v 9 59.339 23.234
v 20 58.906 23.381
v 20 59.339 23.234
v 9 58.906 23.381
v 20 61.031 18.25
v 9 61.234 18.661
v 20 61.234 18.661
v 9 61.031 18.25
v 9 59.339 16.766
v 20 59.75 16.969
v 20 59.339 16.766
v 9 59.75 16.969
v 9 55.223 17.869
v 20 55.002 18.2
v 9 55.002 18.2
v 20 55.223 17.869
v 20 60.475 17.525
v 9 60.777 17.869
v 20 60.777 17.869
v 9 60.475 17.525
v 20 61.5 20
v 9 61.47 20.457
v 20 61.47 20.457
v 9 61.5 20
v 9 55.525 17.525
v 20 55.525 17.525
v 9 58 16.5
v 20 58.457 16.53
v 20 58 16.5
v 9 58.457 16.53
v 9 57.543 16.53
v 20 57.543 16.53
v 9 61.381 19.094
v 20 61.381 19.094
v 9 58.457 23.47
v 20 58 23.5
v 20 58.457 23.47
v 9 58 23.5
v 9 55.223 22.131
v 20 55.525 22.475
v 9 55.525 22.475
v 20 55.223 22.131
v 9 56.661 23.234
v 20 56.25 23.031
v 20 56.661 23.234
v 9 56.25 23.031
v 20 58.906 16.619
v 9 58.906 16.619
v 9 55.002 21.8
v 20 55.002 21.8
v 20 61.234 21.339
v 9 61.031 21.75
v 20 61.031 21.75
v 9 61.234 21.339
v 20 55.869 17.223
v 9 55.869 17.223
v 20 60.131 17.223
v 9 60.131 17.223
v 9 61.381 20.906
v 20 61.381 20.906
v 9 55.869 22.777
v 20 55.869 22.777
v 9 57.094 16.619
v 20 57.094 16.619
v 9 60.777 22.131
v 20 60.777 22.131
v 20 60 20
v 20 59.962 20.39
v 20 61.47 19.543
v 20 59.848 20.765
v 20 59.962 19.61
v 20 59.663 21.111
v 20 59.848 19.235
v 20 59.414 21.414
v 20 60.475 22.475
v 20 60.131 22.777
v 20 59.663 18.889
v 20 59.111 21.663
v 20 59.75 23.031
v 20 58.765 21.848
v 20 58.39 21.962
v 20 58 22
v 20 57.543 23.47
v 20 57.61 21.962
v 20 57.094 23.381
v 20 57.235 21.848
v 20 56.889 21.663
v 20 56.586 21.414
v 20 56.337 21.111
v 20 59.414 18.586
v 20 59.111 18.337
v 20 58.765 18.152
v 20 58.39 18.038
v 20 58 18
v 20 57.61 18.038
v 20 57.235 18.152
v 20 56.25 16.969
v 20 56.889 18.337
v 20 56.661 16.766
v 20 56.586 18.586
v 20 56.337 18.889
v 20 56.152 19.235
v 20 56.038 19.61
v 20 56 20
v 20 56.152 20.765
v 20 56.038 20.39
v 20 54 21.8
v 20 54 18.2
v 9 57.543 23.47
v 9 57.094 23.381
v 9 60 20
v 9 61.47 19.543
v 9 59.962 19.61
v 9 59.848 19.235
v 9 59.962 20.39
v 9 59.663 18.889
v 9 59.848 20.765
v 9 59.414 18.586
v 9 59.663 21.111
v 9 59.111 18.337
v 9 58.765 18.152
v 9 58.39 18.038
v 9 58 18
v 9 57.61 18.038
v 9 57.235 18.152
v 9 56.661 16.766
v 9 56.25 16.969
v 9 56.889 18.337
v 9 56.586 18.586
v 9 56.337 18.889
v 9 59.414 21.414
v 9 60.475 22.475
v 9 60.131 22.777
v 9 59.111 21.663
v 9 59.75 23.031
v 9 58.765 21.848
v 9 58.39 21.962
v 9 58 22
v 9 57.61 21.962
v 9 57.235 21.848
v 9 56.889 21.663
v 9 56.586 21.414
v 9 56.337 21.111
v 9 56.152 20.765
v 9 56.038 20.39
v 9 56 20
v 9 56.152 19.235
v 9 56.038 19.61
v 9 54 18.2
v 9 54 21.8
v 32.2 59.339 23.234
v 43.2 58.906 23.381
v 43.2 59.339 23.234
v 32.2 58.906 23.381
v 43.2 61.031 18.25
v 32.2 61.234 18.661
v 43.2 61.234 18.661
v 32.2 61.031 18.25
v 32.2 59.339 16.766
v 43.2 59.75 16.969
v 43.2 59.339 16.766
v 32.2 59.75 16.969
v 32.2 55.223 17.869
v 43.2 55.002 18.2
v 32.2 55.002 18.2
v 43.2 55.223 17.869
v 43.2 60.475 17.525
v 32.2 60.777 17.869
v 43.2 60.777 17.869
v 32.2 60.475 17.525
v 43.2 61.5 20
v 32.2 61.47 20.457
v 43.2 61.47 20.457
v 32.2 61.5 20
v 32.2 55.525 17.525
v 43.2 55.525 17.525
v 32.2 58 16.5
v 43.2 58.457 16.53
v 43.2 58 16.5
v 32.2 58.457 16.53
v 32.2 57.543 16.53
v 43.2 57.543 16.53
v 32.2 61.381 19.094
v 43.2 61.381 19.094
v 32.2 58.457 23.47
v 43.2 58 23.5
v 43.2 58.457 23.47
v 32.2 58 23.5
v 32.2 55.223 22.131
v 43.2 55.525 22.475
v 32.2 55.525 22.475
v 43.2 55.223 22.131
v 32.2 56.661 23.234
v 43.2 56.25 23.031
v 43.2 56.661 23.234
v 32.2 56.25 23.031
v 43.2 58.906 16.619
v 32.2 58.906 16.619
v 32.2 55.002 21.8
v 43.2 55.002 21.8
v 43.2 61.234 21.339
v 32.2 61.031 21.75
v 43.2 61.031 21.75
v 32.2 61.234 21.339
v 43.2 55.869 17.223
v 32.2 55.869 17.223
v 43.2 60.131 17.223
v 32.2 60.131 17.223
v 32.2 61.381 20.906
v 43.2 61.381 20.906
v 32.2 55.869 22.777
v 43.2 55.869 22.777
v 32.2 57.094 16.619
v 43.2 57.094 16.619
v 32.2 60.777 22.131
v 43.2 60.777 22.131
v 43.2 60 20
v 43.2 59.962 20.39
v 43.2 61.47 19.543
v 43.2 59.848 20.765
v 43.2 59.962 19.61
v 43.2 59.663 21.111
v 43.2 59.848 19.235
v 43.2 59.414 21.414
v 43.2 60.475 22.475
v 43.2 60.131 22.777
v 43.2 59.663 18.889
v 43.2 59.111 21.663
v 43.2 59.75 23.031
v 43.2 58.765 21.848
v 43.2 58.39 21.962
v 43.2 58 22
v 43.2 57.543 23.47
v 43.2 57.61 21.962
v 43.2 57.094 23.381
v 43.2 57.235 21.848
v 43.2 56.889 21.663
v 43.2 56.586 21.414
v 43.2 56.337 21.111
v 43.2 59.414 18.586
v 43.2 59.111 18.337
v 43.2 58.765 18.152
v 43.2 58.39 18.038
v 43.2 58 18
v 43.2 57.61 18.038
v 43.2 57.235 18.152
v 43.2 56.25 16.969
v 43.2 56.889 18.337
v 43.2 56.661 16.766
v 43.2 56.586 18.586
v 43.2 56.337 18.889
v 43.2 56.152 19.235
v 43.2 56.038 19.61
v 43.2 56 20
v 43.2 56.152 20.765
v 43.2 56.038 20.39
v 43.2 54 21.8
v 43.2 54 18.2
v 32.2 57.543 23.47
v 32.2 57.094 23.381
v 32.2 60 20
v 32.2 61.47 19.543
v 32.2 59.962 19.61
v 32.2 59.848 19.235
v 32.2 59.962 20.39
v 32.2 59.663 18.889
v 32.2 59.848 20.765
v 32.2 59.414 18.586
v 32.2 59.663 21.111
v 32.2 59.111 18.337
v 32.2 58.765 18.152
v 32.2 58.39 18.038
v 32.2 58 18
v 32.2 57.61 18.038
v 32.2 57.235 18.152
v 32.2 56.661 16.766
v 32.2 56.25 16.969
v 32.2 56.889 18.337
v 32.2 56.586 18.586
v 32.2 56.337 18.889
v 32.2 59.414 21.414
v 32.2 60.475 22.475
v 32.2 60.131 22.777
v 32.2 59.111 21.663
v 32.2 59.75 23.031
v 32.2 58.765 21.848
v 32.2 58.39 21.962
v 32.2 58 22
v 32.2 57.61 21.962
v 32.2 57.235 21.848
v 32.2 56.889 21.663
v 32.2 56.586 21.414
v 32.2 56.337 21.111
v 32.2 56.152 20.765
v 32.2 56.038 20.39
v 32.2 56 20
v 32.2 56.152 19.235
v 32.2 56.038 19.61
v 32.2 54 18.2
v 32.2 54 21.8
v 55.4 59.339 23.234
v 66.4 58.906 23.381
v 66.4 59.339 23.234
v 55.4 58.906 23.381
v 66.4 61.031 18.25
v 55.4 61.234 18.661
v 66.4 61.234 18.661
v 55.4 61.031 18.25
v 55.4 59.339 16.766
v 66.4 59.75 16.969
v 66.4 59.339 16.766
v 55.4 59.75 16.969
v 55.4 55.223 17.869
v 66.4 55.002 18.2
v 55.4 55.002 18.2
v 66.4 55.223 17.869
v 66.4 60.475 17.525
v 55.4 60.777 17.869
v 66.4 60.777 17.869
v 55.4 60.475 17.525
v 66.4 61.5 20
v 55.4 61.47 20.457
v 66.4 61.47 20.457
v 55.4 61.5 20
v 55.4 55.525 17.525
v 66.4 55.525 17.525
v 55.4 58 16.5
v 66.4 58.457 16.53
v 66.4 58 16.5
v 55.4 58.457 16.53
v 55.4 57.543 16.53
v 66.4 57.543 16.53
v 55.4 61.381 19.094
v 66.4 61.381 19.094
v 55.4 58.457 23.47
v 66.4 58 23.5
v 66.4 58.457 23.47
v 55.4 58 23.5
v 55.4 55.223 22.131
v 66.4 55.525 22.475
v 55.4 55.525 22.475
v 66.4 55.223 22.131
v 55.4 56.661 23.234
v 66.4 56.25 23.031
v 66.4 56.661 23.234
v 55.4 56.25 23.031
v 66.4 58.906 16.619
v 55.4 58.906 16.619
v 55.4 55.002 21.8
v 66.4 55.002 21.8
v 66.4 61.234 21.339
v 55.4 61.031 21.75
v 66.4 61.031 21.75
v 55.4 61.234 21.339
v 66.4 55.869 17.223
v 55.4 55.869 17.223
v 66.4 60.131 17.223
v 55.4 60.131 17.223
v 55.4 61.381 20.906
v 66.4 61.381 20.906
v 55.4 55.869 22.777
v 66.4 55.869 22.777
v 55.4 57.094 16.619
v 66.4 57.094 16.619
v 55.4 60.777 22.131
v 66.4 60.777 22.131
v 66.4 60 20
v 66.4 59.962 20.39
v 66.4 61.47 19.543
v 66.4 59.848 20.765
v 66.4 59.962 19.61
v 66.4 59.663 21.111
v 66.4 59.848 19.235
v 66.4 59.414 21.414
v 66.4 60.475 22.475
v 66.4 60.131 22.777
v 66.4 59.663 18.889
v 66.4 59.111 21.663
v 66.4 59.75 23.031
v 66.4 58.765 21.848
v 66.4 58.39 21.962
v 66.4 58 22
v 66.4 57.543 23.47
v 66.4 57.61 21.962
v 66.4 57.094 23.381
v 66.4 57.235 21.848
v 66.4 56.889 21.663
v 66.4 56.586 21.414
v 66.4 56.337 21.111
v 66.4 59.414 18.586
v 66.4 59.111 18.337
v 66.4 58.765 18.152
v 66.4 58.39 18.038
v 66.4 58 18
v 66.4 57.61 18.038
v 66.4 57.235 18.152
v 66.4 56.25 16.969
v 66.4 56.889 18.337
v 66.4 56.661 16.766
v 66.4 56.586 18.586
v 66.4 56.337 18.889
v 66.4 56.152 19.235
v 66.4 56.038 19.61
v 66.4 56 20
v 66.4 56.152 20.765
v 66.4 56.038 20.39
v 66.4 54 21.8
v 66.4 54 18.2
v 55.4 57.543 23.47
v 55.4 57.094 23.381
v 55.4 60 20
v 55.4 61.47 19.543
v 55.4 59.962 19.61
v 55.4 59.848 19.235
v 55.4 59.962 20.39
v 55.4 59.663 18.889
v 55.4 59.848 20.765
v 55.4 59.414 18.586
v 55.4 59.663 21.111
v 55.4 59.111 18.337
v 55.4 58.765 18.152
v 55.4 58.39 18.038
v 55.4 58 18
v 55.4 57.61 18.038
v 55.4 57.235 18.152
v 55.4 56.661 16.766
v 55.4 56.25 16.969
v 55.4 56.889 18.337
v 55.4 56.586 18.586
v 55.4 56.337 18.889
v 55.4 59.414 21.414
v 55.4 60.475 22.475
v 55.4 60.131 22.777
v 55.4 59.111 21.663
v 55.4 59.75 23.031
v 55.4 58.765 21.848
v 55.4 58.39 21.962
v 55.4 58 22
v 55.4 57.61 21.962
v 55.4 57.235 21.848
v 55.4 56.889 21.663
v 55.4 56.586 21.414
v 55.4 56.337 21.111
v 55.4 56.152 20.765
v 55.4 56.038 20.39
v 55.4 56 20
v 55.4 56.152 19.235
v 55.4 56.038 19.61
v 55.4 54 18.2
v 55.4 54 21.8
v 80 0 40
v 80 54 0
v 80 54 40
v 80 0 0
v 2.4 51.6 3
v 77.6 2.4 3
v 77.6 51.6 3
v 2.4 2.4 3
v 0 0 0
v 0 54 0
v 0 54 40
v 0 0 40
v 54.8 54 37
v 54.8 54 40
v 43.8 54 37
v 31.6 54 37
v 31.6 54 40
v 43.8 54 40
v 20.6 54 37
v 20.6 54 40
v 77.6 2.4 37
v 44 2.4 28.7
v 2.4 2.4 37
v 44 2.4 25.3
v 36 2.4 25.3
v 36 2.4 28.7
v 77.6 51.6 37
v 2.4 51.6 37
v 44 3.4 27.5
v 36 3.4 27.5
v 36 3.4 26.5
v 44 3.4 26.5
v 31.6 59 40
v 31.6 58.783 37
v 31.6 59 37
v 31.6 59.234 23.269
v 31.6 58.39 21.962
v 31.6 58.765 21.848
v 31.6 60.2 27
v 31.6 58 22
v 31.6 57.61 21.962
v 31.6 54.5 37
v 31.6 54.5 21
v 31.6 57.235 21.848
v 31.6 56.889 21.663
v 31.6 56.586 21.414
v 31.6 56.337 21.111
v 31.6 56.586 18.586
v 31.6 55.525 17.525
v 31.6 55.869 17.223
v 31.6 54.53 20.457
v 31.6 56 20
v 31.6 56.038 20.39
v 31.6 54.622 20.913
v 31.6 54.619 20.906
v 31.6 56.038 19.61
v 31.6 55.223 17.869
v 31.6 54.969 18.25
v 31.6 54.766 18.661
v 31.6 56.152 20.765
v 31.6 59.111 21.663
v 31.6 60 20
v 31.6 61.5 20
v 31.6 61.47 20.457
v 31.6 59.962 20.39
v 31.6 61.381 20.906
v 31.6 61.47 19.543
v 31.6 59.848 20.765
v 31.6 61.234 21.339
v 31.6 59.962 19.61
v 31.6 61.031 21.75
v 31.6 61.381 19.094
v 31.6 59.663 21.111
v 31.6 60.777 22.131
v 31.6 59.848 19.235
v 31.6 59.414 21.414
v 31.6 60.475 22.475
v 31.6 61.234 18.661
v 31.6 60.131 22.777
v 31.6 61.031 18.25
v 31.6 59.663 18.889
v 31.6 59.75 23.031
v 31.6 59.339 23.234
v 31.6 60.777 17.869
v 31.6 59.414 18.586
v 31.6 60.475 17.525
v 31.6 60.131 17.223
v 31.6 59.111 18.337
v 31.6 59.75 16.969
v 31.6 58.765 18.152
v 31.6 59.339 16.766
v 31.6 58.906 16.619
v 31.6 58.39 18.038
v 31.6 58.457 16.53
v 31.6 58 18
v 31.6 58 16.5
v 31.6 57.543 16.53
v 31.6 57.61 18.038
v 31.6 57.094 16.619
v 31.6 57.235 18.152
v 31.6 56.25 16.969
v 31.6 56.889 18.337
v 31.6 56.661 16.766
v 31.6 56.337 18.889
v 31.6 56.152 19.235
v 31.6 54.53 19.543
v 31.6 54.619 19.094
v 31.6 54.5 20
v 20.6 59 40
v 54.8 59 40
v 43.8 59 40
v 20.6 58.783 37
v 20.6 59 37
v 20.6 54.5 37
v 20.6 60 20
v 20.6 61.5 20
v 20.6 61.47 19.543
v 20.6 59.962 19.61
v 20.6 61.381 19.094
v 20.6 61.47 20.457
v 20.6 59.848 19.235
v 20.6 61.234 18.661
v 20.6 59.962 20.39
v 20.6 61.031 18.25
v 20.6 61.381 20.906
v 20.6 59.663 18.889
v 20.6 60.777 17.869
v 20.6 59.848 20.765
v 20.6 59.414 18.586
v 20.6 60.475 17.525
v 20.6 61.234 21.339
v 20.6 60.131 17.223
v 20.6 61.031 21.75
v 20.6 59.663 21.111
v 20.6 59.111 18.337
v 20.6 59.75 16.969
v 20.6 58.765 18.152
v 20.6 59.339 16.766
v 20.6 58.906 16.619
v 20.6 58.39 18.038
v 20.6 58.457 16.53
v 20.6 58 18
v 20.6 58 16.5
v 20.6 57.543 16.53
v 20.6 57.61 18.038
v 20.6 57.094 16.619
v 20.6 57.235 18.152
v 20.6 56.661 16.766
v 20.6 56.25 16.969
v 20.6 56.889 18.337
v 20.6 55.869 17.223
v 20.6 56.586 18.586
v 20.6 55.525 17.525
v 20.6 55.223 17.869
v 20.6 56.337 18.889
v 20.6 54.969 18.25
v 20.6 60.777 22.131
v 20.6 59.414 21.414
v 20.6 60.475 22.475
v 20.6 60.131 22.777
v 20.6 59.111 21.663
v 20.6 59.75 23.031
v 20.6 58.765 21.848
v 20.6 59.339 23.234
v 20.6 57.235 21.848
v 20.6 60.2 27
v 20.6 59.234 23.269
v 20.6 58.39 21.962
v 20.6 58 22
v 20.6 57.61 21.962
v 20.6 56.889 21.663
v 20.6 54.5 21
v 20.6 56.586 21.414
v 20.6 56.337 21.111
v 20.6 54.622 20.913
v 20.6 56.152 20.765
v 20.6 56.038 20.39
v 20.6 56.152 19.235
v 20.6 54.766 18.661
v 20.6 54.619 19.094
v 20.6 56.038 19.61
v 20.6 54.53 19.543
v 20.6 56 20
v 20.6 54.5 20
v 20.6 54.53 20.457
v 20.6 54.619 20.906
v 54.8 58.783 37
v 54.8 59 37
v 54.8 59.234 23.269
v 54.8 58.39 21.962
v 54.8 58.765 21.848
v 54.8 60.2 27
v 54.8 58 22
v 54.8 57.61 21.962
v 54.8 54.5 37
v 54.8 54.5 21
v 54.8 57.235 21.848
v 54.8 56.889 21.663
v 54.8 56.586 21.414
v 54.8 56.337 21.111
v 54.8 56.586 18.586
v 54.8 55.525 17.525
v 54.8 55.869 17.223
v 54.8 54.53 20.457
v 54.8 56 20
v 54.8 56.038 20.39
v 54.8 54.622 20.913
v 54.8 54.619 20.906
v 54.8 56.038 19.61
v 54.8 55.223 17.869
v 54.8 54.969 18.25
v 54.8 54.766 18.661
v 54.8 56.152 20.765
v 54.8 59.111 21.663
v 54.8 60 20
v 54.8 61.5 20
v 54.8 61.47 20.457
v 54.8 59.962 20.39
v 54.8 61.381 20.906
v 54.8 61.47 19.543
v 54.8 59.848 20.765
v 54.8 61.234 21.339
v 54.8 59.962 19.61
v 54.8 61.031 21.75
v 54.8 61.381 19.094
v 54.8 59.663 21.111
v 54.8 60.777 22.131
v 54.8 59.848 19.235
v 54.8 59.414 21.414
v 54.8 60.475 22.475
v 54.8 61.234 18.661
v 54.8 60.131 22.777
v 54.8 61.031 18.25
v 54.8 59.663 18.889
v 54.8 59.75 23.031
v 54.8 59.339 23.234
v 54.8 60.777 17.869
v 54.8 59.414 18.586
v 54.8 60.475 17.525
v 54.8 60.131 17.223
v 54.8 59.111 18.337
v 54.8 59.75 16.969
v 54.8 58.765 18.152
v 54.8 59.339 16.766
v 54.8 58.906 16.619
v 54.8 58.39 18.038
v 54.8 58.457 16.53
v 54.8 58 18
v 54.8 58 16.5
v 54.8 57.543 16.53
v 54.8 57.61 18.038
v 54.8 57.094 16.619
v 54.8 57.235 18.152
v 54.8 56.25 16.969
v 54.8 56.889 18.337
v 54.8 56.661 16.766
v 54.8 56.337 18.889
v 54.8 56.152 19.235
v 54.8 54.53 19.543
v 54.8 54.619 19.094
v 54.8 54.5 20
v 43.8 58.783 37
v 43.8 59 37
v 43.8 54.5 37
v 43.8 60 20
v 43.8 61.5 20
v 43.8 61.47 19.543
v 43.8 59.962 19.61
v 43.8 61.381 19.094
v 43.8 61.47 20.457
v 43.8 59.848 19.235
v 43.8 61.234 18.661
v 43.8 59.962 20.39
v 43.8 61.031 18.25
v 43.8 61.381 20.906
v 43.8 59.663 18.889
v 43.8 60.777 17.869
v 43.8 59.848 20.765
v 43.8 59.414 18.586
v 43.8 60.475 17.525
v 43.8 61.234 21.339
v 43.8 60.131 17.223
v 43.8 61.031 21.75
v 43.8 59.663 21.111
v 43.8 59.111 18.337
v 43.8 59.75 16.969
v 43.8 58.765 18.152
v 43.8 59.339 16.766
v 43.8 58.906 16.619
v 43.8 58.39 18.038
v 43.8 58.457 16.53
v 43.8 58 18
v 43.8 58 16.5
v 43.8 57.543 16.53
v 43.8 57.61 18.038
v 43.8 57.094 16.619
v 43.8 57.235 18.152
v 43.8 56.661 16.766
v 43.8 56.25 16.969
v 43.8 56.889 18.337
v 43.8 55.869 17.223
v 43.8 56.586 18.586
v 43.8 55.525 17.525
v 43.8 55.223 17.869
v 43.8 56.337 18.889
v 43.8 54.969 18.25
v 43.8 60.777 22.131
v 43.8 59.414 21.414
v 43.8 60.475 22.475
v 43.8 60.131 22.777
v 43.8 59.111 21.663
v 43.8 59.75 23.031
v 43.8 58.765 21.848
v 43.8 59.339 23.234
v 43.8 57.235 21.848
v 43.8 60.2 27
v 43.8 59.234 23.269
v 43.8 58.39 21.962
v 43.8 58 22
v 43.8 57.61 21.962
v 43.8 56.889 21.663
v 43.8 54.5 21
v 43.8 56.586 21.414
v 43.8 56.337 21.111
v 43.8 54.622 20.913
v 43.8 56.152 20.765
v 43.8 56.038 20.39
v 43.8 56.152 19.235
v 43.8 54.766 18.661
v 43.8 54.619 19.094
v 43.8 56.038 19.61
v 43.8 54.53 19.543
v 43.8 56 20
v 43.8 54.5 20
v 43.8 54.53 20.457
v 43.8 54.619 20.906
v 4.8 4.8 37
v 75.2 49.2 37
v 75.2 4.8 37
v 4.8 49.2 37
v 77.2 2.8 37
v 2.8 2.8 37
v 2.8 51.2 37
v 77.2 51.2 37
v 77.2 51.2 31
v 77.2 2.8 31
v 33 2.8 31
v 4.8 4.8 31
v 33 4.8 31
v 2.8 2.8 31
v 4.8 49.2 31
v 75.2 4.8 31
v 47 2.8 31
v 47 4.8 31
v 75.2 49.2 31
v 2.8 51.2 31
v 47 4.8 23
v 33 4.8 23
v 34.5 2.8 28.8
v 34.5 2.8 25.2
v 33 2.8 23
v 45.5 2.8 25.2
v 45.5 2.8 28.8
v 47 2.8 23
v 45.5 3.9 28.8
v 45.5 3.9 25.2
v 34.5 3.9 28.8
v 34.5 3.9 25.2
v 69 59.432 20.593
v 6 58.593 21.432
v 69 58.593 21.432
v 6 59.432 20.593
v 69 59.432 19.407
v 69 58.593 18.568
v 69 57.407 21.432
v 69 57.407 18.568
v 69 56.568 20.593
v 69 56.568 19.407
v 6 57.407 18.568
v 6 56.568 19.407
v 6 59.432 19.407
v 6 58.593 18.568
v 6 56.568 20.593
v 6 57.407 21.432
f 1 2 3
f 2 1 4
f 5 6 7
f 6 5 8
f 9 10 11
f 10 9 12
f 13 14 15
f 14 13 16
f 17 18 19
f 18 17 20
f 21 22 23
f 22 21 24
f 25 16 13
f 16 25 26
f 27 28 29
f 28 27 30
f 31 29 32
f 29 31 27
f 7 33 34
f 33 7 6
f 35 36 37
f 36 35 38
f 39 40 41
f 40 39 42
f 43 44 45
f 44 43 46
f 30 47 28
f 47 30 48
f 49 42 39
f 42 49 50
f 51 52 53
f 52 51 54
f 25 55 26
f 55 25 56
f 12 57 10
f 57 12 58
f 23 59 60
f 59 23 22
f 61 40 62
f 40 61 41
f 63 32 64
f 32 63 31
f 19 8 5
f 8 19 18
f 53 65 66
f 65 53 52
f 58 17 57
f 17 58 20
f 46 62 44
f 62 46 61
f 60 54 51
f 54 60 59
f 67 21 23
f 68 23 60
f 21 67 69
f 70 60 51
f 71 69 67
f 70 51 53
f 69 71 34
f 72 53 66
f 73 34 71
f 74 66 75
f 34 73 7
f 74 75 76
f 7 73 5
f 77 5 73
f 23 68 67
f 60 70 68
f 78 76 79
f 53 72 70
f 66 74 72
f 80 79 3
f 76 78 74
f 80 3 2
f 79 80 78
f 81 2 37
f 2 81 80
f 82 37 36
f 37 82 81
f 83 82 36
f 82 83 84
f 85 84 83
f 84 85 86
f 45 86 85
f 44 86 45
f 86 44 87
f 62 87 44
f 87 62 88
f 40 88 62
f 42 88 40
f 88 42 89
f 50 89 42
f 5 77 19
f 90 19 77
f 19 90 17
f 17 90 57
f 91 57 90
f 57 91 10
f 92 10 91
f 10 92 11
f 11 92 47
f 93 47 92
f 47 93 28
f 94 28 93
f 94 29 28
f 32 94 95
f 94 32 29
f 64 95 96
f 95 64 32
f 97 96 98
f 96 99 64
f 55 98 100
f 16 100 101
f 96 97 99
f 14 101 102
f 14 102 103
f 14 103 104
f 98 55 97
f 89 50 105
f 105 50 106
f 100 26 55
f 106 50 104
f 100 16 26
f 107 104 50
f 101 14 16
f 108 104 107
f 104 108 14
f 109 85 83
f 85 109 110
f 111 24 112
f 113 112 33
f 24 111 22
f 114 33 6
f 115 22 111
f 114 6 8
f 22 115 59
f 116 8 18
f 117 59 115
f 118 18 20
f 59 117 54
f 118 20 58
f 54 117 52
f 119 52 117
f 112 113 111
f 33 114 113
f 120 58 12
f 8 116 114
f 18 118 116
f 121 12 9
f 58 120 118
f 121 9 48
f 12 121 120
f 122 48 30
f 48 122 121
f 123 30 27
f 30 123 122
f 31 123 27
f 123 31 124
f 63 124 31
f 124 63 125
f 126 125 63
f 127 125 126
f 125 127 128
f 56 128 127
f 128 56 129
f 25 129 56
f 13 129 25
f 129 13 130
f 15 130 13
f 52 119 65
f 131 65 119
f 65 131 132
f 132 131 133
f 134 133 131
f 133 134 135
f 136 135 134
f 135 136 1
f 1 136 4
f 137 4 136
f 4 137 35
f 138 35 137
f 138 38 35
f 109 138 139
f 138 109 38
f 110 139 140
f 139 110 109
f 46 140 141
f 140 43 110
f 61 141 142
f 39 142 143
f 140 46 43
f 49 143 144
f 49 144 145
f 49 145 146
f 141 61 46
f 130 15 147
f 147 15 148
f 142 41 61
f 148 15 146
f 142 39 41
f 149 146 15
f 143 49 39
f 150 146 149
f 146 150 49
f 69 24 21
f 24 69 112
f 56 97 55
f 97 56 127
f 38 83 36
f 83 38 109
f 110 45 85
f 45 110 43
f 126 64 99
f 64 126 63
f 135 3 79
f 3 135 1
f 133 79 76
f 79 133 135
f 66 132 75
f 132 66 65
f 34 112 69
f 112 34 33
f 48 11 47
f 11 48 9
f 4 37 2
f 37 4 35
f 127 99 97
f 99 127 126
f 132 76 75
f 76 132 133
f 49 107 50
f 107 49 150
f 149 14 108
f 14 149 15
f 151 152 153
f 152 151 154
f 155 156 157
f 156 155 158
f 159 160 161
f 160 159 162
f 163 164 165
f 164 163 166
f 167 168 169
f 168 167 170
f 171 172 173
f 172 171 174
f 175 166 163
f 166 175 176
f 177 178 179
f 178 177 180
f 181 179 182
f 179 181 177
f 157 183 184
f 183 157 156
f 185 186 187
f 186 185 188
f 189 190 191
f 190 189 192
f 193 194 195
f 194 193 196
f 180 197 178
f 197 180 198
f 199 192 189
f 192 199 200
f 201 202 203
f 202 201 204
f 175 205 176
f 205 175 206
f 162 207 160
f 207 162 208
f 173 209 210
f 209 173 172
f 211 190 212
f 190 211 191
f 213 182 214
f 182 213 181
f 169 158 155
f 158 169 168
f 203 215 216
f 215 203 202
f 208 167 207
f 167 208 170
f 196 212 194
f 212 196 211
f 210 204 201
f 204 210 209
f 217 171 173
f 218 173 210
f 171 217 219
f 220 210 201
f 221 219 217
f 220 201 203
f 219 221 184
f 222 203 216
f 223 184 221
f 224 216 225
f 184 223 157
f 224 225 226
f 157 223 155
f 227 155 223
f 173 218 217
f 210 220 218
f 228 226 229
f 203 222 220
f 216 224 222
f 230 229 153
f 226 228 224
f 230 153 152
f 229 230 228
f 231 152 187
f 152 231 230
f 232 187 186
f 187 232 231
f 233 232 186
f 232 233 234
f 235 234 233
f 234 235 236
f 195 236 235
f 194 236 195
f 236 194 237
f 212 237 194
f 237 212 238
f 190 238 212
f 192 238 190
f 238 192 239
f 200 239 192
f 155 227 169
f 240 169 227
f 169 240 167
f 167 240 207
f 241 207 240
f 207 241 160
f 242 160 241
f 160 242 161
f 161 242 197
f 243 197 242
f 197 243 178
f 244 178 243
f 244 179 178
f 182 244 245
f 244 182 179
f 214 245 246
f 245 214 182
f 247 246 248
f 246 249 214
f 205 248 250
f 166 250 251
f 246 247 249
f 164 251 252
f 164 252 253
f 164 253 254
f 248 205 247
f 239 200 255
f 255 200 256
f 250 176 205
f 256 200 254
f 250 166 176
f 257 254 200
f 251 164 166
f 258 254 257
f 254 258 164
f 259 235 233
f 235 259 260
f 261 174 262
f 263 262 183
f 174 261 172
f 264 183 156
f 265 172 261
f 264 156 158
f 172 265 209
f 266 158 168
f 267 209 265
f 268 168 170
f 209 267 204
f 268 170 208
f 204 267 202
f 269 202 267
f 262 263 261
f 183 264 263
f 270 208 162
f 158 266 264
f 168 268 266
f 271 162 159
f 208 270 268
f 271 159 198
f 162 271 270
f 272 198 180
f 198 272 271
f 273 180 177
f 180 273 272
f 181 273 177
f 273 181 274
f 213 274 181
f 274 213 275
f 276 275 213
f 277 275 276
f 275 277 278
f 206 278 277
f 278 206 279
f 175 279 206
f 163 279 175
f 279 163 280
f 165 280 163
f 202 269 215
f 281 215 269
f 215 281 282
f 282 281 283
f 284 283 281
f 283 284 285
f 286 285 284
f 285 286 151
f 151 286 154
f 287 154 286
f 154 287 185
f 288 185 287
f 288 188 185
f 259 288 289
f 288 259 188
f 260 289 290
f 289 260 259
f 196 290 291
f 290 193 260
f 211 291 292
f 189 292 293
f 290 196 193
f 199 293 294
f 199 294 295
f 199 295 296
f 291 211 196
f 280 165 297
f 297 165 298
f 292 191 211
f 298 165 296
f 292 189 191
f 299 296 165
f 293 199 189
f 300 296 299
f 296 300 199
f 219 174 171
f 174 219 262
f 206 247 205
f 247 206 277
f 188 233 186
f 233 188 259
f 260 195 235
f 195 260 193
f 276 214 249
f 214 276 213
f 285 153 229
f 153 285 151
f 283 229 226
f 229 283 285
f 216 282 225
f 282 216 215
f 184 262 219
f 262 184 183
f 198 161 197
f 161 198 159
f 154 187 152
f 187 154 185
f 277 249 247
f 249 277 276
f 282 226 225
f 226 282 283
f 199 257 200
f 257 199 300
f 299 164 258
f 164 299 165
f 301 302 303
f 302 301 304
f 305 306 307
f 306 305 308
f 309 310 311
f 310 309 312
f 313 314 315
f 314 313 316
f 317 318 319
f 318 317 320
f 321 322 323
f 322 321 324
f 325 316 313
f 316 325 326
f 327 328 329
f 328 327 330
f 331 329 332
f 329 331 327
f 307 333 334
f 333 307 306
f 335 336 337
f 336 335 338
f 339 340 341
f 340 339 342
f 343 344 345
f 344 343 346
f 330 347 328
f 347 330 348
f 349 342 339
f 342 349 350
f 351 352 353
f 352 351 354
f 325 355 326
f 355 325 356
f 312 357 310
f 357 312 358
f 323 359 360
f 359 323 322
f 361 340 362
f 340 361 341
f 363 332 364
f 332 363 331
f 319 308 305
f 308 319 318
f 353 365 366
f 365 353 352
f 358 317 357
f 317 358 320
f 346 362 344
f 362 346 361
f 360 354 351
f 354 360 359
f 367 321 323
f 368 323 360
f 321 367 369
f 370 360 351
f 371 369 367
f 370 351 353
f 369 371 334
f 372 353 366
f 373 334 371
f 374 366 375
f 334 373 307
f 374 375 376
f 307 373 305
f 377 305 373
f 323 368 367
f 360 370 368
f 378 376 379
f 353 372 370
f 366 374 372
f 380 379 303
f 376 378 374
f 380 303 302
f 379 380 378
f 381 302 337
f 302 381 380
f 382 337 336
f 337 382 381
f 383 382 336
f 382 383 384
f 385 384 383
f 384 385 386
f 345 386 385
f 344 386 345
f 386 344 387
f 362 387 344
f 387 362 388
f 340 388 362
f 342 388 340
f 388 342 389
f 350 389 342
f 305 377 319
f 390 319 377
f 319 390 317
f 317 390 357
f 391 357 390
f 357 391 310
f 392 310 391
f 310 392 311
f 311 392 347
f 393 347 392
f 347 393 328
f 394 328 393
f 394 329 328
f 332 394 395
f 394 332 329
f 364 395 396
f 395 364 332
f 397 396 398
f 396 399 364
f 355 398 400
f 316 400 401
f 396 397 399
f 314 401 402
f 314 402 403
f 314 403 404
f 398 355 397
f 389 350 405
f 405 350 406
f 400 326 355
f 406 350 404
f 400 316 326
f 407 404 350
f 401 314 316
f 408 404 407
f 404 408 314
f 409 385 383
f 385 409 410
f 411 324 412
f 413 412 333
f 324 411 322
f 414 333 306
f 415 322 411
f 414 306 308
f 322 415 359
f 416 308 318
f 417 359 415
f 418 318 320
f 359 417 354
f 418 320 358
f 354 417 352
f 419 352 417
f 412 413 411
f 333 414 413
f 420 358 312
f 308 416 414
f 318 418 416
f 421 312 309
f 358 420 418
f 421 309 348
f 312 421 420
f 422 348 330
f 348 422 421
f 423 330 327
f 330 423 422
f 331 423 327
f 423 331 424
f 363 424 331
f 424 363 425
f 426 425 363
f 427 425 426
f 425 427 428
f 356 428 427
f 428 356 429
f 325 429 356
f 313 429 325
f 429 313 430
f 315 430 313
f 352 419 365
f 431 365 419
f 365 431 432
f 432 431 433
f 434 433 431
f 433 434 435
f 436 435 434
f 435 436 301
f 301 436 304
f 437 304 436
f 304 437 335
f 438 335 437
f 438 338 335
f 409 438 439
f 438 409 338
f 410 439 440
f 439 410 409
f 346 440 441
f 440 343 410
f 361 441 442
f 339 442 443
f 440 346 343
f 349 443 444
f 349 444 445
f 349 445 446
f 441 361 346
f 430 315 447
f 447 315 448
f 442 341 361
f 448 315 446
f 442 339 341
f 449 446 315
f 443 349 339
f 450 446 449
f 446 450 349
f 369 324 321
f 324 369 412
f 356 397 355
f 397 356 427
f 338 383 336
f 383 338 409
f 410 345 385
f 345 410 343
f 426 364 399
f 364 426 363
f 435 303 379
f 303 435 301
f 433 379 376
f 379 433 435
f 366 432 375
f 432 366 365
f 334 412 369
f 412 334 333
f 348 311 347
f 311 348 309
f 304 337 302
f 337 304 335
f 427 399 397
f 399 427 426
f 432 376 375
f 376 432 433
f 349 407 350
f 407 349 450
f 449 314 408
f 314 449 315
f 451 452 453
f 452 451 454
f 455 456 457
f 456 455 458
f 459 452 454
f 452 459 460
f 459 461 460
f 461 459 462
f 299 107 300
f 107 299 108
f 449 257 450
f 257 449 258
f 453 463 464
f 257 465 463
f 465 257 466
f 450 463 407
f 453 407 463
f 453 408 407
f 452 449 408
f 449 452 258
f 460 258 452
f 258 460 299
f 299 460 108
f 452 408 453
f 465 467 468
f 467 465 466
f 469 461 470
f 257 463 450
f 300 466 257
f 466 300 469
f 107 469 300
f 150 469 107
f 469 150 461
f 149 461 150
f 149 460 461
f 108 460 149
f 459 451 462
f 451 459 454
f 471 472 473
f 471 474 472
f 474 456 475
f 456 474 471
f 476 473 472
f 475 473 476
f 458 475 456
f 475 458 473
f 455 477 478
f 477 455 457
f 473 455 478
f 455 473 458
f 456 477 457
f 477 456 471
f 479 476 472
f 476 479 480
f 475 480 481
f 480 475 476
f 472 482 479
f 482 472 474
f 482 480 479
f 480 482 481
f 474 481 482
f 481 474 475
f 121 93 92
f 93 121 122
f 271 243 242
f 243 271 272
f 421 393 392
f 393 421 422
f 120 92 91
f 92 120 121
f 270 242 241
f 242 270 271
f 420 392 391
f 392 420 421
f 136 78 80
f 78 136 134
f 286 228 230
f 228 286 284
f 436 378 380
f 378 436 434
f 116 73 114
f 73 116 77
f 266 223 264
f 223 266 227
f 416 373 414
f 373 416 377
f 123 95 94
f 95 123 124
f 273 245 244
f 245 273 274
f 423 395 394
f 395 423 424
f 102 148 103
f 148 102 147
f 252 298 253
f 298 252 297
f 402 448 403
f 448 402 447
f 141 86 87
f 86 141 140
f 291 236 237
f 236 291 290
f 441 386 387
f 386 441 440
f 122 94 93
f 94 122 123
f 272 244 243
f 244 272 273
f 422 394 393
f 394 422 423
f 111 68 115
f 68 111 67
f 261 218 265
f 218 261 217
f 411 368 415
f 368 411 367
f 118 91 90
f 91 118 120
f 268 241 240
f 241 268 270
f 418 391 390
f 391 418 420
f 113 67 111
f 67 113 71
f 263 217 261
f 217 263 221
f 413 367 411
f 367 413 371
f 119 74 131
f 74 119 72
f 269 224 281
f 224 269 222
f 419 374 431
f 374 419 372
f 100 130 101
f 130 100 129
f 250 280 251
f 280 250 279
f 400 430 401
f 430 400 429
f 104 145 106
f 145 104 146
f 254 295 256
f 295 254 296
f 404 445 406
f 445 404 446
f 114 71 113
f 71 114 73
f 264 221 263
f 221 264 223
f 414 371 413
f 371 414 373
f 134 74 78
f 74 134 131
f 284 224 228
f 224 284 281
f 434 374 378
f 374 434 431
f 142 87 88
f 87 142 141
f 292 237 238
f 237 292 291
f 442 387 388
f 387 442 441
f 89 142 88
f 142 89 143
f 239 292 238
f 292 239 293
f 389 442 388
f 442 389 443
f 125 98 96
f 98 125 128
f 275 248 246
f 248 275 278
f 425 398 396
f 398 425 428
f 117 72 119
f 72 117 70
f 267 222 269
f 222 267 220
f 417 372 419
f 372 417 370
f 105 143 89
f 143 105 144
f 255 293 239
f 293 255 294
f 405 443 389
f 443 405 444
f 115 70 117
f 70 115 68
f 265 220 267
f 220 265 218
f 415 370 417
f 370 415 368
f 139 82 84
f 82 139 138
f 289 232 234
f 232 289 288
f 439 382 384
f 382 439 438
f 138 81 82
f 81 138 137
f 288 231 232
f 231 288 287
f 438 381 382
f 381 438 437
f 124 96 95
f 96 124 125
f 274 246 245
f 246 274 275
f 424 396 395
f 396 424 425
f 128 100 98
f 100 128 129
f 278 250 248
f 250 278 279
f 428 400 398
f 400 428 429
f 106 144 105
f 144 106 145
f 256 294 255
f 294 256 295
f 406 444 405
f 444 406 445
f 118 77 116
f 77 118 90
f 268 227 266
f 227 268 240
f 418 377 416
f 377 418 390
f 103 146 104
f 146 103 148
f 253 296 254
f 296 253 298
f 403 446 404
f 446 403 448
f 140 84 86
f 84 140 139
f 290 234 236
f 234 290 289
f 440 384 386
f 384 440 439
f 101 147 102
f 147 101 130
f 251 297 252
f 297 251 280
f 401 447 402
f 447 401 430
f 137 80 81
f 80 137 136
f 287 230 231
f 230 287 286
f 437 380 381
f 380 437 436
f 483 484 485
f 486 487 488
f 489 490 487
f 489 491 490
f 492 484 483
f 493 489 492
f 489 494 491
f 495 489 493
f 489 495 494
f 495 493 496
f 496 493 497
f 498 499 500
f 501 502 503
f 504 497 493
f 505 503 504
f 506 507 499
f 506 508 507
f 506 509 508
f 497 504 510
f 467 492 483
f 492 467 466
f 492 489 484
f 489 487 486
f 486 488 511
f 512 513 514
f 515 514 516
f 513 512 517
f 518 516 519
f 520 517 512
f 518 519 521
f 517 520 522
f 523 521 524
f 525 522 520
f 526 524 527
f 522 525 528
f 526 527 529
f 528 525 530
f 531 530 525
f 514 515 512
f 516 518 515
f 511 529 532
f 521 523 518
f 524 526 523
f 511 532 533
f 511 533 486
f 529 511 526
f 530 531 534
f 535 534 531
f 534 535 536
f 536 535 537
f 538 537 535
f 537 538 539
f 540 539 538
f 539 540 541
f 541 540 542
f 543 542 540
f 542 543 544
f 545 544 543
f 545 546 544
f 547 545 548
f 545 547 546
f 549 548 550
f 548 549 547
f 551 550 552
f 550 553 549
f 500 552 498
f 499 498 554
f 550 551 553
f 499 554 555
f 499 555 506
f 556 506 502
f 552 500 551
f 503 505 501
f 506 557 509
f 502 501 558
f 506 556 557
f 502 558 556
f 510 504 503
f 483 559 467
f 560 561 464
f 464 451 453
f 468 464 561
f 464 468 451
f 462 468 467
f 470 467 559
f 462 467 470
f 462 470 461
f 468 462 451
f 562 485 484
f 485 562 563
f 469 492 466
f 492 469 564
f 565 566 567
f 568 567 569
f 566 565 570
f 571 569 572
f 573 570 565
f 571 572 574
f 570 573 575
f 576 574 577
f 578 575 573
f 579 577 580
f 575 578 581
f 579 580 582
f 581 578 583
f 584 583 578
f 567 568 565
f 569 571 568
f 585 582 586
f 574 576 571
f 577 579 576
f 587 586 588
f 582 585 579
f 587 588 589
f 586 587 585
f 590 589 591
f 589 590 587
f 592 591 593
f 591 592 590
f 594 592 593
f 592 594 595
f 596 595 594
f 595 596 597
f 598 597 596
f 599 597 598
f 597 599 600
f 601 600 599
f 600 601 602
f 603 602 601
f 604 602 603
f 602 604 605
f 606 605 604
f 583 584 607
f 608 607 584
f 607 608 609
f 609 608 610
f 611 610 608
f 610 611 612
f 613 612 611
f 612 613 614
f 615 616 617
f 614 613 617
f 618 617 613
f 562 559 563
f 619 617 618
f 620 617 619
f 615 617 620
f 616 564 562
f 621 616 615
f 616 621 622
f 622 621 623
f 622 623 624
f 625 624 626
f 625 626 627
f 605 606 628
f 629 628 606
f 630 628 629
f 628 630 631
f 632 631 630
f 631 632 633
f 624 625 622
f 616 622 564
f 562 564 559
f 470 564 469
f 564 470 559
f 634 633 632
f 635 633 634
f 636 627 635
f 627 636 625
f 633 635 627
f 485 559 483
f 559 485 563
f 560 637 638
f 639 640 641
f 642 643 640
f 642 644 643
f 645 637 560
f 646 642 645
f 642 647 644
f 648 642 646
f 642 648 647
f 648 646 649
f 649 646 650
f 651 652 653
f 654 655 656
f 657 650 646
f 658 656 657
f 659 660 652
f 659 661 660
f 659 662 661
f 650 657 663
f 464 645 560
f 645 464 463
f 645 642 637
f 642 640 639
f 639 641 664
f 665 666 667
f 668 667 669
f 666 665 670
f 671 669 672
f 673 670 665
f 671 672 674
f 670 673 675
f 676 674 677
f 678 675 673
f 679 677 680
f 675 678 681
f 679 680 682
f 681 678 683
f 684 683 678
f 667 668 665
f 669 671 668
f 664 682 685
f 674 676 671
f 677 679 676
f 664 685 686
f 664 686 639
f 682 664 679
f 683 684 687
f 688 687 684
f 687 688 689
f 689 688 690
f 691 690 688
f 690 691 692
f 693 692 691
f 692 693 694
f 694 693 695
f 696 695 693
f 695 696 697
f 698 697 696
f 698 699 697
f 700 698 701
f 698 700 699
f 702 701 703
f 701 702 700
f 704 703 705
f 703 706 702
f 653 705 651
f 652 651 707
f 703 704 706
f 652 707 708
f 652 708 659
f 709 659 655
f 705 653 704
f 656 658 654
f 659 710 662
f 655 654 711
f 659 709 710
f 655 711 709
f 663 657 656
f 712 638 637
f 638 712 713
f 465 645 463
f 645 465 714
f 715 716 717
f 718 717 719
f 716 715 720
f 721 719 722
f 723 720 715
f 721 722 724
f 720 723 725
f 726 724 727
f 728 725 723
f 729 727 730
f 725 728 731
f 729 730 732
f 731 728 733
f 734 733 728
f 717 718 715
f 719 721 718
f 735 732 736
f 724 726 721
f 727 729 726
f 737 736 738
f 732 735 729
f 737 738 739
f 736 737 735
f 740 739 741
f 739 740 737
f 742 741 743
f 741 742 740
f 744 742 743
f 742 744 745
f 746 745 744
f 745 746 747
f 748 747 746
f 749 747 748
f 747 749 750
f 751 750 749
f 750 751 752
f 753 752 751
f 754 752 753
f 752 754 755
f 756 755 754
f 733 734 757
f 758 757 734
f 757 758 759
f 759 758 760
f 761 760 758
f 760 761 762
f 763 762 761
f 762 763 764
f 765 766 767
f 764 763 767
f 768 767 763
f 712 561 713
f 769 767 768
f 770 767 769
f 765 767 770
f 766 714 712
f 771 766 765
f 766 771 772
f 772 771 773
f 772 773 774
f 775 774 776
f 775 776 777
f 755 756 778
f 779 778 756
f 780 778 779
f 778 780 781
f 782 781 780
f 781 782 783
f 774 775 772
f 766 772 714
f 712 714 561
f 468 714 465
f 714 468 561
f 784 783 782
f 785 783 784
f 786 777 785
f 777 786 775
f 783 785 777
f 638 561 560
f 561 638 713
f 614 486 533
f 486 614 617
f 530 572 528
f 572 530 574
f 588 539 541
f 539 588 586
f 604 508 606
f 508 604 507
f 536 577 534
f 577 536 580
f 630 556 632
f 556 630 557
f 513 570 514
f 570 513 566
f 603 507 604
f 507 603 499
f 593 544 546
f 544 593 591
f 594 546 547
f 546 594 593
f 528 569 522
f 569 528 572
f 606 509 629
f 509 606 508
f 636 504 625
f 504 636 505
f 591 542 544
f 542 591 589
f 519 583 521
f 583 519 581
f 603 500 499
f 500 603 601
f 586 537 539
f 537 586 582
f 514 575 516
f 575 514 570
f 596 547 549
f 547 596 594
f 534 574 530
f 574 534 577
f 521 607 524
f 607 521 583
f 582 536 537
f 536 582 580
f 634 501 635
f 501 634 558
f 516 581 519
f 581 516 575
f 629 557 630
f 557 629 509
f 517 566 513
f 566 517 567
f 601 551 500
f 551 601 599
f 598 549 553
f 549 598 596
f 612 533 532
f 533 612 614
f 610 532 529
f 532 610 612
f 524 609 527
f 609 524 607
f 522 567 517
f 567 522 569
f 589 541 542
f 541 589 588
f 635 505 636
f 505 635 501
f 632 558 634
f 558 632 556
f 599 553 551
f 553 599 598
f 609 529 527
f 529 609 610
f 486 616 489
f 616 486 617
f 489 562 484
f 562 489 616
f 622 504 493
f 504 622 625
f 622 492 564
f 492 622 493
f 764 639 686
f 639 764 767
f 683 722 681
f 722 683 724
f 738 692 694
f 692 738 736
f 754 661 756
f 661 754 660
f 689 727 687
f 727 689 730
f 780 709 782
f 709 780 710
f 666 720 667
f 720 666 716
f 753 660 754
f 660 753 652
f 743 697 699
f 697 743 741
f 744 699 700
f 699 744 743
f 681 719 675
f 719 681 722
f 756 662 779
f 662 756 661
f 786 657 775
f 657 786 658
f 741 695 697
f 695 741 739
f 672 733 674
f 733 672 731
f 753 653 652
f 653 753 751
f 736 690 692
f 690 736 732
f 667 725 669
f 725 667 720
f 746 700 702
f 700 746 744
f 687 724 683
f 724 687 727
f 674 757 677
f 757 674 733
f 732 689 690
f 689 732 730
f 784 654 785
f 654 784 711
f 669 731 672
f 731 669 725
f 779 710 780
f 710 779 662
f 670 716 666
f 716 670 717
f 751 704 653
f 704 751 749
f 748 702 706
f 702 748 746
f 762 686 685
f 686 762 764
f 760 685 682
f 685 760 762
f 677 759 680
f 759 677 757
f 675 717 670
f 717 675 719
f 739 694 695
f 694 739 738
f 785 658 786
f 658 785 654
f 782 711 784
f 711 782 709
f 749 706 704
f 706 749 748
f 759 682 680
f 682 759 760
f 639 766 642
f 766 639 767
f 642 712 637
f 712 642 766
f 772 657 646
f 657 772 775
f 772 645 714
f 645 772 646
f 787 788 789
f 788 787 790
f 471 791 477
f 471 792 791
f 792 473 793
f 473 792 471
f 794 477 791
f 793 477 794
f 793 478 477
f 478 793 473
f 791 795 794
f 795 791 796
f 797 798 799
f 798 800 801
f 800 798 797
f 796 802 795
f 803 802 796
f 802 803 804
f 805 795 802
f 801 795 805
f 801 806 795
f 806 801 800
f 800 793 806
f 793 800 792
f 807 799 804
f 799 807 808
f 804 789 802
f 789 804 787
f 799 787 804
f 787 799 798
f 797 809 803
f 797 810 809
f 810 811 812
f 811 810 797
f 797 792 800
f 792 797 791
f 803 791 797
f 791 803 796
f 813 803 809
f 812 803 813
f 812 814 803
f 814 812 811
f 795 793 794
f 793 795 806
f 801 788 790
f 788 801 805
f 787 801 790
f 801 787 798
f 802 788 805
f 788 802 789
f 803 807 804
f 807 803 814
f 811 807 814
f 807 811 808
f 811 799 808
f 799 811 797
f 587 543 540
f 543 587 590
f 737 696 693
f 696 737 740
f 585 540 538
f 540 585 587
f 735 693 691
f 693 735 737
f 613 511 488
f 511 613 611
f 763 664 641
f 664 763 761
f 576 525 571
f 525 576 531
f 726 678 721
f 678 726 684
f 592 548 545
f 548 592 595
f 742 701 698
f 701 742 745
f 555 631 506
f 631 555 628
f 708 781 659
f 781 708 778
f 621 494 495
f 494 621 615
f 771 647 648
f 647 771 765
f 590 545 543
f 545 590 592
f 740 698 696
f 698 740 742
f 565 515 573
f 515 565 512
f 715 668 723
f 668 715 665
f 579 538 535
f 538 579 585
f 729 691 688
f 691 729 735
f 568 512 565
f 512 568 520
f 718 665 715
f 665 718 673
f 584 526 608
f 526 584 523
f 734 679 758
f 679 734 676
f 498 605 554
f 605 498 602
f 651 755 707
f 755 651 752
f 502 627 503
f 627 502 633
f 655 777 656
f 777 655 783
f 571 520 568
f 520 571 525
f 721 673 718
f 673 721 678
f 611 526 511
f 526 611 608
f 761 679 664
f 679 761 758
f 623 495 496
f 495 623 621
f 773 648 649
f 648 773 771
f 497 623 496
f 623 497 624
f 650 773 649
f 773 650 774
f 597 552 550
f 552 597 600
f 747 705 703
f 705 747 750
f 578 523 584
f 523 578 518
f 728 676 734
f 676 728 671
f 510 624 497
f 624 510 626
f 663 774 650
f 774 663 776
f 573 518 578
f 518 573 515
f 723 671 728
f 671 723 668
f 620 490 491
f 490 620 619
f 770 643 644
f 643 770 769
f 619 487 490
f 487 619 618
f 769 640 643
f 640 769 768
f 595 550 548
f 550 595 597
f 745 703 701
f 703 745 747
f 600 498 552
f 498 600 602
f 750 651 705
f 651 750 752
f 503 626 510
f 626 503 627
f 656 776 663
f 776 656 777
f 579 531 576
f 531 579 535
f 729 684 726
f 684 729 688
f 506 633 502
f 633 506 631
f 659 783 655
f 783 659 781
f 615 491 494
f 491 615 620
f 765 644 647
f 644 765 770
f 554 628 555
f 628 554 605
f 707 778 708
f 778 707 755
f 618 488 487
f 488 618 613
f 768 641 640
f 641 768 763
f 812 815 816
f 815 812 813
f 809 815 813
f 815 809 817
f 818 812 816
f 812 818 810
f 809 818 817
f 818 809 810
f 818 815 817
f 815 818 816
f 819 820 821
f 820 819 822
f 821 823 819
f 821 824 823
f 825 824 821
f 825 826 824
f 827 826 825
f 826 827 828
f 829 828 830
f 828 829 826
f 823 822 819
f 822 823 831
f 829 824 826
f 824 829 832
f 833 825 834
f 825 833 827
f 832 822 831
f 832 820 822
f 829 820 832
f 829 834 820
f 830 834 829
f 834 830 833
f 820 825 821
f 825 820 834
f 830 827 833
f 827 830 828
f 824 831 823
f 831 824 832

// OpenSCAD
// Box with print-in-place hinge
// Closed body 80 (x) x 54 (y body, 61.5 incl. hinge) x 40 (z) mm.
// Lid occupies the top 10 mm. Hinge pin axis: y=58, z=20 (mid-height at the
// back), so swinging the lid -180 deg about that axis lays the lid flat on
// the bed behind the box: that is the print-in-place pose.
// Clearances (PLA, 0.4 nozzle): pin/bore 0.40 radial, knuckle axial gaps
// 0.6, lid lip to box walls 0.4, lid barrels to box back wall 0.5.

part = "assembly"; // [assembly, box, lid, pin]
cadverify_only = "";

W = 80; D = 54; H = 40; box_h = 30;
wall = 2.4; floor_t = 3; plate_t = 3;
hinge_y = 58; hinge_z = 20;
barrel_r = 3.5; bore_r = 2.0; pin_r = 1.55; cap_r = 2.9;
hinge_ymax = hinge_y + barrel_r;          // 61.5
box_segs  = [[9, 11], [32.2, 11], [55.4, 11]];   // [x0, len]
lid_segs  = [[20.6, 11], [43.8, 11]];
pin_x0 = 6; pin_len = 63;

module instance(name, partname, unit = 1) {
    echo(cadverify_instance = [name, partname, unit]);
    if (cadverify_only == "" || cadverify_only == name) children();
}

// Extrude a (y,z) profile along +x starting at x0, offset by (oy,oz).
module extrude_yz(profile, x0, len, oy = 0, oz = 0) {
    multmatrix([[0,0,1,x0],[1,0,0,oy],[0,1,0,oz],[0,0,0,1]])
        linear_extrude(height = len) polygon(points = profile);
}

module barrel(x0, len) {
    translate([x0, hinge_y, hinge_z]) rotate([0, 90, 0])
        cylinder(h = len, r = barrel_r, $fn = 48);
}

module bore_cut() {
    translate([4, hinge_y, hinge_z]) rotate([0, 90, 0])
        cylinder(h = 72, r = bore_r, $fn = 32);
}

module box_closed() {
    difference() {
        union() {
            // floor and walls up to z=30
            translate([0, 0, 0]) cube([W, D, floor_t]);
            translate([0, 0, floor_t]) cube([W, wall, box_h - floor_t]);              // front
            translate([0, D - wall, floor_t]) cube([W, wall, box_h - floor_t]);       // back
            translate([0, wall, floor_t]) cube([wall, D - 2*wall, box_h - floor_t]);  // left
            translate([W - wall, wall, floor_t]) cube([wall, D - 2*wall, box_h - floor_t]); // right
            // front catch detent bump on the inner front wall (wedged ridge)
            extrude_yz([[2.4,25.3],[3.4,26.5],[3.4,27.5],[2.4,28.7]], 36, 8);
            // hinge knuckles + arms to the back wall
            for (s = box_segs) {
                barrel(s[0], s[1]);
                translate([s[0], 53.5, hinge_z - 1.8]) cube([s[1], 5, 3.6]);
            }
        }
        bore_cut();
    }
}

module lid_closed() {
    difference() {
        union() {
            // top plate + back hinge tabs
            translate([0, 0, H - plate_t]) cube([W, D, plate_t]);
            for (s = lid_segs) translate([s[0], 53, H - plate_t]) cube([s[1], 6, plate_t]);
            // external skirt (down to z=30, flush with box walls outside)
            translate([0, 0, box_h]) cube([W, wall, H - plate_t - box_h]);                  // front
            translate([0, D - wall, box_h]) cube([W, wall, H - plate_t - box_h]);           // back
            translate([0, wall, box_h]) cube([wall, D - 2*wall, H - plate_t - box_h]);      // left
            translate([W - wall, wall, box_h]) cube([wall, D - 2*wall, H - plate_t - box_h]); // right
            // inner sealing lip (0.4 clear of box inner walls)
            translate([2.8, 2.8, 31]) cube([74.4, 2, 6]);        // front lip
            translate([2.8, 49.2, 31]) cube([74.4, 2, 6]);       // back lip
            translate([2.8, 4.8, 31]) cube([2, 44.4, 6]);        // left lip
            translate([75.2, 4.8, 31]) cube([2, 44.4, 6]);       // right lip
            // central catch tongue on the front lip, reaching down to z=23
            translate([33, 2.8, 23]) cube([14, 2, 8]);
            // hinge knuckles + diagonal straps up to the plate tabs
            for (s = lid_segs) {
                barrel(s[0], s[1]);
                extrude_yz([[54.5,39],[58.5,39],[60.2,27],[58,18.5],[54.5,21]], s[0], s[1]);
            }
        }
        bore_cut();
        // catch groove in the tongue (receives the box detent bump when shut)
        translate([34.5, 2.7, 25.2]) cube([11, 1.2, 3.6]);
        // fingernail scoop in the front skirt bottom edge
        translate([40, -1, box_h]) rotate([90, 0, 0]) cylinder(h = 4, r = 4.5, $fn = 32);
    }
}

function oct_pts(r) = [for (i = [0:7]) let (a = 22.5 + 45*i) [r*cos(a), r*sin(a)]];

module pin_closed() {
    // plain octagonal axle (flats top/bottom), ends protrude past the outer knuckles
    extrude_yz(oct_pts(pin_r), pin_x0, pin_len, hinge_y, hinge_z);
}

// --- printed (as-exported) orientations ---
module lid_printed() {
    // closed lid rotated 180 deg about the hinge axis, then dropped to y=0
    translate([0, hinge_ymax, H]) rotate([180, 0, 0]) lid_closed();
}
pin_off = pin_r * cos(22.5); // 1.432 half-height of the octagonal shaft
module pin_printed() {
    translate([-pin_x0, -(hinge_y - pin_off), -(hinge_z - pin_off)]) pin_closed();
}

box_spec = [
    ["bounds", [[0, 0, 0], [W, hinge_ymax, box_h]]],
    ["bodies", 1],
    ["support_faces", [["bed", "-z", 4000]]],
    ["overhangs_allowed", [
        ["hinge barrels and arms: horizontal print-in-place axle housings, bore is self-supported inside the tube", [[8, 53, 16], [67.5, 62, 24]]]
    ]],
    ["copies", 1],
    ["details", [
        ["floor", "material", [[10, 10, 0.5], [70, 44, 2.5]], 0.98],
        ["interior", "void", [[6, 6, 8], [74, 48, 24]], 0.98],
        ["front_wall", "thickness", [40, -1, 15], [0, 1, 0], 2.4],
        ["knuckle_arm", "material", [[10, 53.8, 18.8], [19, 55.8, 21.2]], 0.9],
        ["hinge_bore", "void", [[10, 56.7, 18.7], [19, 59.3, 21.3]], 1.0],
        ["catch_bump", "material", [[37, 2.6, 26.6], [43, 3.3, 27.4]], 0.85],
        ["catch_bump_view", "view", [[35, 2, 24], [45, 4.5, 29.5]]],
        ["hinge_view", "view", [[8, 53, 15], [67, 62, 25]]]
    ]]
];

lid_spec = [
    ["bounds", [[0, 0, 0], [W, hinge_ymax, 23.5]]],
    ["bodies", 1],
    ["support_faces", [["bed", "-z", 4000]]],
    ["overhangs_allowed", [
        ["hinge barrels and straps: horizontal print-in-place axle housings", [[20, 0, 0], [55.5, 8, 24]]],
        ["catch groove underside in print pose", [[34, 56, 11], [46, 59, 15]]]
    ]],
    ["copies", 1],
    ["details", [
        ["top_plate", "material", [[10, 17.5, 0.5], [70, 51.5, 2.5]], 0.98],
        ["front_skirt", "material", [[10, 59.3, 4.5], [70, 61.3, 7.5]], 0.9],
        ["plate_thickness", "thickness", [40, 30, -1], [0, 0, 1], 3],
        ["tongue", "material", [[38, 57, 9.2], [42, 58.5, 10.3]], 0.85],
        ["catch_groove", "void", [[37, 57.7, 12], [43, 58.5, 14]], 1.0],
        ["hinge_bore", "void", [[23, 2.2, 18.7], [29, 4.8, 21.3]], 1.0],
        ["strap", "material", [[23, 3.5, 8], [29, 6.5, 12]], 0.8],
        ["catch_groove_view", "view", [[33, 56.5, 9], [47, 59, 17]]],
        ["lid_knuckle_view", "view", [[20, 0, 16], [32, 8, 24]]]
    ]]
];

pin_spec = [
    ["bounds", [[0, 0, 0], [pin_len, 2*pin_off, 2*pin_off]]],
    ["bodies", 1],
    ["support_faces", [["bed", "-z", 50]]],
    ["overhangs_allowed", [
        ["lower facets of the horizontal print-in-place axle, 0.45 above the bore that supports it", [[-0.1, -0.1, -0.1], [63.1, 3.0, 1.6]]]
    ]],
    ["copies", 1],
    ["details", [
        ["shaft", "material", [[10, 0.9, 0.9], [50, 1.95, 1.95]], 0.9],
        ["shaft_thickness", "thickness", [30, pin_off, -1], [0, 0, 1], 2.865],
        ["pin_end_view", "view", [[0, 0, 0], [3, 2.87, 2.87]]]
    ]]
];

assembly_spec = [
    ["bounds", [[0, 0, 0], [W, hinge_ymax, H]]],
    ["support_faces", [["table", "-z", 4000]]],
    ["motions", [
        ["lid_swing", ["lid"], "rotate", [0, hinge_y, hinge_z], [1, 0, 0], [-180, 0],
            ["flex", [["lid", "box", 1.0, "front catch tongue snaps 0.6 mm over the detent bump while closing"]]]]
    ]],
    ["assembly_order", [
        [["pin"], [0, 0, 0]],
        [["box"], [-1, 0, 0]],
        [["lid"], [0, 0, -1], ["rotate", [0, hinge_y, hinge_z], [1, 0, 0], -180]]
    ]],
    ["print_in_place", 0.4],
    ["print_pose", [["lid_swing", -180]]],
    ["overhangs_allowed", [
        ["box hinge barrels in print pose", [[8, 53, 16], [67.5, 62, 24]]],
        ["lid hinge barrels and straps in print pose", [[20, 53, 0], [56, 62, 24]]],
        ["horizontal pin inside its bore, 0.4 above the bore surface", [[5, 55, 16.5], [70.5, 61, 20]]],
        ["lid catch groove in print pose", [[33, 110, 2], [47, 114, 18]]]
    ]]
];

if (part == "box") {
    echo(cadverify_spec = box_spec);
    box_closed();
} else if (part == "lid") {
    echo(cadverify_spec = lid_spec);
    lid_printed();
} else if (part == "pin") {
    echo(cadverify_spec = pin_spec);
    pin_printed();
} else {
    echo(cadverify_spec = assembly_spec);
    instance("box", "box") box_closed();
    instance("lid", "lid")
        translate([0, hinge_ymax, H]) rotate([180, 0, 0]) lid_printed();
    instance("pin", "pin")
        translate([pin_x0, hinge_y - pin_off, hinge_z - pin_off]) pin_printed();
}
